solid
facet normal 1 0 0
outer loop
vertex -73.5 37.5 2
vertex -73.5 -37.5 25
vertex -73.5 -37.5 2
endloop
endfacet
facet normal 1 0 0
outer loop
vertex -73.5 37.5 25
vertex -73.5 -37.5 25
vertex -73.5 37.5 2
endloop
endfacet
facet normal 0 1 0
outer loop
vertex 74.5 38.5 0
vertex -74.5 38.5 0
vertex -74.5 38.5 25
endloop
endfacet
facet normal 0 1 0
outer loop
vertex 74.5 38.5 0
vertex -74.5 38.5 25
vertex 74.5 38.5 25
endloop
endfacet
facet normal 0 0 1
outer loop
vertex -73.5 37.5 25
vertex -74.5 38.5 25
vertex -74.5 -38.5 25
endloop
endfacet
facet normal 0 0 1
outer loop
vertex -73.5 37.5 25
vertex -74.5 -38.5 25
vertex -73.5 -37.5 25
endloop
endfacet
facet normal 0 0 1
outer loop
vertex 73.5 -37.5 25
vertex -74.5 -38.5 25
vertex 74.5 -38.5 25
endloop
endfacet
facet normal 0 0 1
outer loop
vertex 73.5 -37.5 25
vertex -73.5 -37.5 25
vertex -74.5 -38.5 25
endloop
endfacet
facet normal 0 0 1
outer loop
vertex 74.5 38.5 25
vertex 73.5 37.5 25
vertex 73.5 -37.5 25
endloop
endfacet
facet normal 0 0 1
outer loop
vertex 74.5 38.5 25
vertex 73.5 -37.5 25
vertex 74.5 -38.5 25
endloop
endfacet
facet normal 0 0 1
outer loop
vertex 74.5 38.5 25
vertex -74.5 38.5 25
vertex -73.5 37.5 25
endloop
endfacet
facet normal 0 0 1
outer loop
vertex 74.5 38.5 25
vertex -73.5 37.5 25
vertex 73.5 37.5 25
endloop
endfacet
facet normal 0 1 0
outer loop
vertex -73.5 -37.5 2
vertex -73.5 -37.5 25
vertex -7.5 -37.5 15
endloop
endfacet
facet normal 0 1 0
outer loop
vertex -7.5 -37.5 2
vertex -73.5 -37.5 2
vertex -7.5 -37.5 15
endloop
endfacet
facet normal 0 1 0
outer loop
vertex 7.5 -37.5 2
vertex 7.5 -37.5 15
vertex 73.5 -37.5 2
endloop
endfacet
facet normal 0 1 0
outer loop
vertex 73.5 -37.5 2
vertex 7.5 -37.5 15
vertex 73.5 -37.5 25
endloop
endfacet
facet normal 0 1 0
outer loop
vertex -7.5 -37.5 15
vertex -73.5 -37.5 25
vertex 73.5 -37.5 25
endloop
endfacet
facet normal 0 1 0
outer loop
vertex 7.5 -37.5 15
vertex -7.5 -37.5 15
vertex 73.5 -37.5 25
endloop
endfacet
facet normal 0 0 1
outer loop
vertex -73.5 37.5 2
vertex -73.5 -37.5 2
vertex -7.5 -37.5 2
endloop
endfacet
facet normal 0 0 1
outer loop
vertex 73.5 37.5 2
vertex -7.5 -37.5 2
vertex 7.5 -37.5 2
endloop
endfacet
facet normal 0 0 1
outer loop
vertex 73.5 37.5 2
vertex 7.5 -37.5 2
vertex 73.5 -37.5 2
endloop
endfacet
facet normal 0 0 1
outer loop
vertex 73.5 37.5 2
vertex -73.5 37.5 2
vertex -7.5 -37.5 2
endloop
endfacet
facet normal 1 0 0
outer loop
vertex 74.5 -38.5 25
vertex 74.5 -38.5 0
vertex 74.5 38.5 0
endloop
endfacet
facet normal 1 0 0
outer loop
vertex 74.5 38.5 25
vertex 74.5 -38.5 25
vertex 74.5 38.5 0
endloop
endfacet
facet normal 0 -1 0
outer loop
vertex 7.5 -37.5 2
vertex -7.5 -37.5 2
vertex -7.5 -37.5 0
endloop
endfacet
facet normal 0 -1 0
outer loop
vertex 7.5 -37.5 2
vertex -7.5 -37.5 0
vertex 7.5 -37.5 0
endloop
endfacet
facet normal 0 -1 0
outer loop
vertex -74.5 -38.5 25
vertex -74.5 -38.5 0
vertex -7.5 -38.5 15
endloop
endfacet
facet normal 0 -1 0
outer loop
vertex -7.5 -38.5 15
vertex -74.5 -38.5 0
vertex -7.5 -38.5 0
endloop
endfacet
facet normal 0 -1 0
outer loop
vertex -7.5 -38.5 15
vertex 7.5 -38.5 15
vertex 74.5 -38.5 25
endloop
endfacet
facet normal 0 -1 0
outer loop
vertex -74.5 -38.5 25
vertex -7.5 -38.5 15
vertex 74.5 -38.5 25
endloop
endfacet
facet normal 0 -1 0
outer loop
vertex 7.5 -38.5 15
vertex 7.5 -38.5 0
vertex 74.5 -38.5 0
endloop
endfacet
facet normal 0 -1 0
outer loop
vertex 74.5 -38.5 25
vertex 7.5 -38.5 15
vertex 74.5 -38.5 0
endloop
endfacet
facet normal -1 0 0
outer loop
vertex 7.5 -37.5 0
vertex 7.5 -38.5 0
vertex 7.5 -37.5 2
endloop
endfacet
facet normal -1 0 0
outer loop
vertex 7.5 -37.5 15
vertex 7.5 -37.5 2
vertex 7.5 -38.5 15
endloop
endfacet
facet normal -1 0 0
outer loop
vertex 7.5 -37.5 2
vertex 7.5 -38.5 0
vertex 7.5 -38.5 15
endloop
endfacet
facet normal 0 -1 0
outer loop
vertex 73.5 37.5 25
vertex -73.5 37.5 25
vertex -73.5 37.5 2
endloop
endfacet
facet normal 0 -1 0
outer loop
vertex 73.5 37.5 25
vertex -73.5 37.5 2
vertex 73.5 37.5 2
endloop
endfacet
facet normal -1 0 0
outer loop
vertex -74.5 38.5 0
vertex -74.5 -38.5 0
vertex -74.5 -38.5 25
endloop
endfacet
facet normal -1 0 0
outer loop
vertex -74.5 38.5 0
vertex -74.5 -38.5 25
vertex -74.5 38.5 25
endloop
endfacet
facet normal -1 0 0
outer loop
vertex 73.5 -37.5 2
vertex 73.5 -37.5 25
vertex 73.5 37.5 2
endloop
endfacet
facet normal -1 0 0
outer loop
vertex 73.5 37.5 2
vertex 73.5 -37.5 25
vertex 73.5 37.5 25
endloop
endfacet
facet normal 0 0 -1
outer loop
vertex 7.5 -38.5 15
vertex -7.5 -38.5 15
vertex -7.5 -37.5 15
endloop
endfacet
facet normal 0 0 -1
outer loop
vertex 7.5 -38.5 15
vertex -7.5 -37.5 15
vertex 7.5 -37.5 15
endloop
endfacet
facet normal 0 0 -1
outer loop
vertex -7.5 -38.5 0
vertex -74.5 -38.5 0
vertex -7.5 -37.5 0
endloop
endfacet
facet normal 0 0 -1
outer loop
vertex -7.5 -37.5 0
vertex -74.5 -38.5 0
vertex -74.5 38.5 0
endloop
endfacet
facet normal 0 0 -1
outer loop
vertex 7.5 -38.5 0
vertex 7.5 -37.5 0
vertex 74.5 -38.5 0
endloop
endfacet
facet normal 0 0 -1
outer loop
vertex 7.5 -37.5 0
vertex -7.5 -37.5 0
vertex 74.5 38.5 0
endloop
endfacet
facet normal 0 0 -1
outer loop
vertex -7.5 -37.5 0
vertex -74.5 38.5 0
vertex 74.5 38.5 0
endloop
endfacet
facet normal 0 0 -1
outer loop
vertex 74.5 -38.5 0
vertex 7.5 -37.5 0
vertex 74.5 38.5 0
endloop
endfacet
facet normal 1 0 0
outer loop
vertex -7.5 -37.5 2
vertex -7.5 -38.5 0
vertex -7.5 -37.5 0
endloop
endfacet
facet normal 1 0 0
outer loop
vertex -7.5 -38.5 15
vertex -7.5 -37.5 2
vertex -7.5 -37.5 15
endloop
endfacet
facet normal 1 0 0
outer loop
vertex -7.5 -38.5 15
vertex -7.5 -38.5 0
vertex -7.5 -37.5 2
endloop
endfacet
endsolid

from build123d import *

# Parameters (mm, degrees)
F0_W     = 149
F0_H     = 77
F1_DEPTH = 25
F2_W     = 147
F2_H     = 75
F3_DEPTH = 23
F4_W     = 15
F4_H     = 15
F5_DEPTH = 1


with BuildPart() as f1:
    # F0 (on Top) → F1 (new body)
    with BuildSketch(Plane.XY):
        Rectangle(F0_W, F0_H)
    extrude(amount=F1_DEPTH)

    # F2 (on face) → F3 (cut)
    with BuildSketch(Plane.XY.offset(25)):
        Rectangle(F2_W, F2_H)
    extrude(amount=-F3_DEPTH, mode=Mode.SUBTRACT)

    # F4 (on face) → F5 (cut)
    with BuildSketch(Plane.XZ.offset(38.5)):
        with Locations((0, 7.5)):
            Rectangle(F4_W, F4_H)
    extrude(amount=-F5_DEPTH, mode=Mode.SUBTRACT)


solid = f1.part
